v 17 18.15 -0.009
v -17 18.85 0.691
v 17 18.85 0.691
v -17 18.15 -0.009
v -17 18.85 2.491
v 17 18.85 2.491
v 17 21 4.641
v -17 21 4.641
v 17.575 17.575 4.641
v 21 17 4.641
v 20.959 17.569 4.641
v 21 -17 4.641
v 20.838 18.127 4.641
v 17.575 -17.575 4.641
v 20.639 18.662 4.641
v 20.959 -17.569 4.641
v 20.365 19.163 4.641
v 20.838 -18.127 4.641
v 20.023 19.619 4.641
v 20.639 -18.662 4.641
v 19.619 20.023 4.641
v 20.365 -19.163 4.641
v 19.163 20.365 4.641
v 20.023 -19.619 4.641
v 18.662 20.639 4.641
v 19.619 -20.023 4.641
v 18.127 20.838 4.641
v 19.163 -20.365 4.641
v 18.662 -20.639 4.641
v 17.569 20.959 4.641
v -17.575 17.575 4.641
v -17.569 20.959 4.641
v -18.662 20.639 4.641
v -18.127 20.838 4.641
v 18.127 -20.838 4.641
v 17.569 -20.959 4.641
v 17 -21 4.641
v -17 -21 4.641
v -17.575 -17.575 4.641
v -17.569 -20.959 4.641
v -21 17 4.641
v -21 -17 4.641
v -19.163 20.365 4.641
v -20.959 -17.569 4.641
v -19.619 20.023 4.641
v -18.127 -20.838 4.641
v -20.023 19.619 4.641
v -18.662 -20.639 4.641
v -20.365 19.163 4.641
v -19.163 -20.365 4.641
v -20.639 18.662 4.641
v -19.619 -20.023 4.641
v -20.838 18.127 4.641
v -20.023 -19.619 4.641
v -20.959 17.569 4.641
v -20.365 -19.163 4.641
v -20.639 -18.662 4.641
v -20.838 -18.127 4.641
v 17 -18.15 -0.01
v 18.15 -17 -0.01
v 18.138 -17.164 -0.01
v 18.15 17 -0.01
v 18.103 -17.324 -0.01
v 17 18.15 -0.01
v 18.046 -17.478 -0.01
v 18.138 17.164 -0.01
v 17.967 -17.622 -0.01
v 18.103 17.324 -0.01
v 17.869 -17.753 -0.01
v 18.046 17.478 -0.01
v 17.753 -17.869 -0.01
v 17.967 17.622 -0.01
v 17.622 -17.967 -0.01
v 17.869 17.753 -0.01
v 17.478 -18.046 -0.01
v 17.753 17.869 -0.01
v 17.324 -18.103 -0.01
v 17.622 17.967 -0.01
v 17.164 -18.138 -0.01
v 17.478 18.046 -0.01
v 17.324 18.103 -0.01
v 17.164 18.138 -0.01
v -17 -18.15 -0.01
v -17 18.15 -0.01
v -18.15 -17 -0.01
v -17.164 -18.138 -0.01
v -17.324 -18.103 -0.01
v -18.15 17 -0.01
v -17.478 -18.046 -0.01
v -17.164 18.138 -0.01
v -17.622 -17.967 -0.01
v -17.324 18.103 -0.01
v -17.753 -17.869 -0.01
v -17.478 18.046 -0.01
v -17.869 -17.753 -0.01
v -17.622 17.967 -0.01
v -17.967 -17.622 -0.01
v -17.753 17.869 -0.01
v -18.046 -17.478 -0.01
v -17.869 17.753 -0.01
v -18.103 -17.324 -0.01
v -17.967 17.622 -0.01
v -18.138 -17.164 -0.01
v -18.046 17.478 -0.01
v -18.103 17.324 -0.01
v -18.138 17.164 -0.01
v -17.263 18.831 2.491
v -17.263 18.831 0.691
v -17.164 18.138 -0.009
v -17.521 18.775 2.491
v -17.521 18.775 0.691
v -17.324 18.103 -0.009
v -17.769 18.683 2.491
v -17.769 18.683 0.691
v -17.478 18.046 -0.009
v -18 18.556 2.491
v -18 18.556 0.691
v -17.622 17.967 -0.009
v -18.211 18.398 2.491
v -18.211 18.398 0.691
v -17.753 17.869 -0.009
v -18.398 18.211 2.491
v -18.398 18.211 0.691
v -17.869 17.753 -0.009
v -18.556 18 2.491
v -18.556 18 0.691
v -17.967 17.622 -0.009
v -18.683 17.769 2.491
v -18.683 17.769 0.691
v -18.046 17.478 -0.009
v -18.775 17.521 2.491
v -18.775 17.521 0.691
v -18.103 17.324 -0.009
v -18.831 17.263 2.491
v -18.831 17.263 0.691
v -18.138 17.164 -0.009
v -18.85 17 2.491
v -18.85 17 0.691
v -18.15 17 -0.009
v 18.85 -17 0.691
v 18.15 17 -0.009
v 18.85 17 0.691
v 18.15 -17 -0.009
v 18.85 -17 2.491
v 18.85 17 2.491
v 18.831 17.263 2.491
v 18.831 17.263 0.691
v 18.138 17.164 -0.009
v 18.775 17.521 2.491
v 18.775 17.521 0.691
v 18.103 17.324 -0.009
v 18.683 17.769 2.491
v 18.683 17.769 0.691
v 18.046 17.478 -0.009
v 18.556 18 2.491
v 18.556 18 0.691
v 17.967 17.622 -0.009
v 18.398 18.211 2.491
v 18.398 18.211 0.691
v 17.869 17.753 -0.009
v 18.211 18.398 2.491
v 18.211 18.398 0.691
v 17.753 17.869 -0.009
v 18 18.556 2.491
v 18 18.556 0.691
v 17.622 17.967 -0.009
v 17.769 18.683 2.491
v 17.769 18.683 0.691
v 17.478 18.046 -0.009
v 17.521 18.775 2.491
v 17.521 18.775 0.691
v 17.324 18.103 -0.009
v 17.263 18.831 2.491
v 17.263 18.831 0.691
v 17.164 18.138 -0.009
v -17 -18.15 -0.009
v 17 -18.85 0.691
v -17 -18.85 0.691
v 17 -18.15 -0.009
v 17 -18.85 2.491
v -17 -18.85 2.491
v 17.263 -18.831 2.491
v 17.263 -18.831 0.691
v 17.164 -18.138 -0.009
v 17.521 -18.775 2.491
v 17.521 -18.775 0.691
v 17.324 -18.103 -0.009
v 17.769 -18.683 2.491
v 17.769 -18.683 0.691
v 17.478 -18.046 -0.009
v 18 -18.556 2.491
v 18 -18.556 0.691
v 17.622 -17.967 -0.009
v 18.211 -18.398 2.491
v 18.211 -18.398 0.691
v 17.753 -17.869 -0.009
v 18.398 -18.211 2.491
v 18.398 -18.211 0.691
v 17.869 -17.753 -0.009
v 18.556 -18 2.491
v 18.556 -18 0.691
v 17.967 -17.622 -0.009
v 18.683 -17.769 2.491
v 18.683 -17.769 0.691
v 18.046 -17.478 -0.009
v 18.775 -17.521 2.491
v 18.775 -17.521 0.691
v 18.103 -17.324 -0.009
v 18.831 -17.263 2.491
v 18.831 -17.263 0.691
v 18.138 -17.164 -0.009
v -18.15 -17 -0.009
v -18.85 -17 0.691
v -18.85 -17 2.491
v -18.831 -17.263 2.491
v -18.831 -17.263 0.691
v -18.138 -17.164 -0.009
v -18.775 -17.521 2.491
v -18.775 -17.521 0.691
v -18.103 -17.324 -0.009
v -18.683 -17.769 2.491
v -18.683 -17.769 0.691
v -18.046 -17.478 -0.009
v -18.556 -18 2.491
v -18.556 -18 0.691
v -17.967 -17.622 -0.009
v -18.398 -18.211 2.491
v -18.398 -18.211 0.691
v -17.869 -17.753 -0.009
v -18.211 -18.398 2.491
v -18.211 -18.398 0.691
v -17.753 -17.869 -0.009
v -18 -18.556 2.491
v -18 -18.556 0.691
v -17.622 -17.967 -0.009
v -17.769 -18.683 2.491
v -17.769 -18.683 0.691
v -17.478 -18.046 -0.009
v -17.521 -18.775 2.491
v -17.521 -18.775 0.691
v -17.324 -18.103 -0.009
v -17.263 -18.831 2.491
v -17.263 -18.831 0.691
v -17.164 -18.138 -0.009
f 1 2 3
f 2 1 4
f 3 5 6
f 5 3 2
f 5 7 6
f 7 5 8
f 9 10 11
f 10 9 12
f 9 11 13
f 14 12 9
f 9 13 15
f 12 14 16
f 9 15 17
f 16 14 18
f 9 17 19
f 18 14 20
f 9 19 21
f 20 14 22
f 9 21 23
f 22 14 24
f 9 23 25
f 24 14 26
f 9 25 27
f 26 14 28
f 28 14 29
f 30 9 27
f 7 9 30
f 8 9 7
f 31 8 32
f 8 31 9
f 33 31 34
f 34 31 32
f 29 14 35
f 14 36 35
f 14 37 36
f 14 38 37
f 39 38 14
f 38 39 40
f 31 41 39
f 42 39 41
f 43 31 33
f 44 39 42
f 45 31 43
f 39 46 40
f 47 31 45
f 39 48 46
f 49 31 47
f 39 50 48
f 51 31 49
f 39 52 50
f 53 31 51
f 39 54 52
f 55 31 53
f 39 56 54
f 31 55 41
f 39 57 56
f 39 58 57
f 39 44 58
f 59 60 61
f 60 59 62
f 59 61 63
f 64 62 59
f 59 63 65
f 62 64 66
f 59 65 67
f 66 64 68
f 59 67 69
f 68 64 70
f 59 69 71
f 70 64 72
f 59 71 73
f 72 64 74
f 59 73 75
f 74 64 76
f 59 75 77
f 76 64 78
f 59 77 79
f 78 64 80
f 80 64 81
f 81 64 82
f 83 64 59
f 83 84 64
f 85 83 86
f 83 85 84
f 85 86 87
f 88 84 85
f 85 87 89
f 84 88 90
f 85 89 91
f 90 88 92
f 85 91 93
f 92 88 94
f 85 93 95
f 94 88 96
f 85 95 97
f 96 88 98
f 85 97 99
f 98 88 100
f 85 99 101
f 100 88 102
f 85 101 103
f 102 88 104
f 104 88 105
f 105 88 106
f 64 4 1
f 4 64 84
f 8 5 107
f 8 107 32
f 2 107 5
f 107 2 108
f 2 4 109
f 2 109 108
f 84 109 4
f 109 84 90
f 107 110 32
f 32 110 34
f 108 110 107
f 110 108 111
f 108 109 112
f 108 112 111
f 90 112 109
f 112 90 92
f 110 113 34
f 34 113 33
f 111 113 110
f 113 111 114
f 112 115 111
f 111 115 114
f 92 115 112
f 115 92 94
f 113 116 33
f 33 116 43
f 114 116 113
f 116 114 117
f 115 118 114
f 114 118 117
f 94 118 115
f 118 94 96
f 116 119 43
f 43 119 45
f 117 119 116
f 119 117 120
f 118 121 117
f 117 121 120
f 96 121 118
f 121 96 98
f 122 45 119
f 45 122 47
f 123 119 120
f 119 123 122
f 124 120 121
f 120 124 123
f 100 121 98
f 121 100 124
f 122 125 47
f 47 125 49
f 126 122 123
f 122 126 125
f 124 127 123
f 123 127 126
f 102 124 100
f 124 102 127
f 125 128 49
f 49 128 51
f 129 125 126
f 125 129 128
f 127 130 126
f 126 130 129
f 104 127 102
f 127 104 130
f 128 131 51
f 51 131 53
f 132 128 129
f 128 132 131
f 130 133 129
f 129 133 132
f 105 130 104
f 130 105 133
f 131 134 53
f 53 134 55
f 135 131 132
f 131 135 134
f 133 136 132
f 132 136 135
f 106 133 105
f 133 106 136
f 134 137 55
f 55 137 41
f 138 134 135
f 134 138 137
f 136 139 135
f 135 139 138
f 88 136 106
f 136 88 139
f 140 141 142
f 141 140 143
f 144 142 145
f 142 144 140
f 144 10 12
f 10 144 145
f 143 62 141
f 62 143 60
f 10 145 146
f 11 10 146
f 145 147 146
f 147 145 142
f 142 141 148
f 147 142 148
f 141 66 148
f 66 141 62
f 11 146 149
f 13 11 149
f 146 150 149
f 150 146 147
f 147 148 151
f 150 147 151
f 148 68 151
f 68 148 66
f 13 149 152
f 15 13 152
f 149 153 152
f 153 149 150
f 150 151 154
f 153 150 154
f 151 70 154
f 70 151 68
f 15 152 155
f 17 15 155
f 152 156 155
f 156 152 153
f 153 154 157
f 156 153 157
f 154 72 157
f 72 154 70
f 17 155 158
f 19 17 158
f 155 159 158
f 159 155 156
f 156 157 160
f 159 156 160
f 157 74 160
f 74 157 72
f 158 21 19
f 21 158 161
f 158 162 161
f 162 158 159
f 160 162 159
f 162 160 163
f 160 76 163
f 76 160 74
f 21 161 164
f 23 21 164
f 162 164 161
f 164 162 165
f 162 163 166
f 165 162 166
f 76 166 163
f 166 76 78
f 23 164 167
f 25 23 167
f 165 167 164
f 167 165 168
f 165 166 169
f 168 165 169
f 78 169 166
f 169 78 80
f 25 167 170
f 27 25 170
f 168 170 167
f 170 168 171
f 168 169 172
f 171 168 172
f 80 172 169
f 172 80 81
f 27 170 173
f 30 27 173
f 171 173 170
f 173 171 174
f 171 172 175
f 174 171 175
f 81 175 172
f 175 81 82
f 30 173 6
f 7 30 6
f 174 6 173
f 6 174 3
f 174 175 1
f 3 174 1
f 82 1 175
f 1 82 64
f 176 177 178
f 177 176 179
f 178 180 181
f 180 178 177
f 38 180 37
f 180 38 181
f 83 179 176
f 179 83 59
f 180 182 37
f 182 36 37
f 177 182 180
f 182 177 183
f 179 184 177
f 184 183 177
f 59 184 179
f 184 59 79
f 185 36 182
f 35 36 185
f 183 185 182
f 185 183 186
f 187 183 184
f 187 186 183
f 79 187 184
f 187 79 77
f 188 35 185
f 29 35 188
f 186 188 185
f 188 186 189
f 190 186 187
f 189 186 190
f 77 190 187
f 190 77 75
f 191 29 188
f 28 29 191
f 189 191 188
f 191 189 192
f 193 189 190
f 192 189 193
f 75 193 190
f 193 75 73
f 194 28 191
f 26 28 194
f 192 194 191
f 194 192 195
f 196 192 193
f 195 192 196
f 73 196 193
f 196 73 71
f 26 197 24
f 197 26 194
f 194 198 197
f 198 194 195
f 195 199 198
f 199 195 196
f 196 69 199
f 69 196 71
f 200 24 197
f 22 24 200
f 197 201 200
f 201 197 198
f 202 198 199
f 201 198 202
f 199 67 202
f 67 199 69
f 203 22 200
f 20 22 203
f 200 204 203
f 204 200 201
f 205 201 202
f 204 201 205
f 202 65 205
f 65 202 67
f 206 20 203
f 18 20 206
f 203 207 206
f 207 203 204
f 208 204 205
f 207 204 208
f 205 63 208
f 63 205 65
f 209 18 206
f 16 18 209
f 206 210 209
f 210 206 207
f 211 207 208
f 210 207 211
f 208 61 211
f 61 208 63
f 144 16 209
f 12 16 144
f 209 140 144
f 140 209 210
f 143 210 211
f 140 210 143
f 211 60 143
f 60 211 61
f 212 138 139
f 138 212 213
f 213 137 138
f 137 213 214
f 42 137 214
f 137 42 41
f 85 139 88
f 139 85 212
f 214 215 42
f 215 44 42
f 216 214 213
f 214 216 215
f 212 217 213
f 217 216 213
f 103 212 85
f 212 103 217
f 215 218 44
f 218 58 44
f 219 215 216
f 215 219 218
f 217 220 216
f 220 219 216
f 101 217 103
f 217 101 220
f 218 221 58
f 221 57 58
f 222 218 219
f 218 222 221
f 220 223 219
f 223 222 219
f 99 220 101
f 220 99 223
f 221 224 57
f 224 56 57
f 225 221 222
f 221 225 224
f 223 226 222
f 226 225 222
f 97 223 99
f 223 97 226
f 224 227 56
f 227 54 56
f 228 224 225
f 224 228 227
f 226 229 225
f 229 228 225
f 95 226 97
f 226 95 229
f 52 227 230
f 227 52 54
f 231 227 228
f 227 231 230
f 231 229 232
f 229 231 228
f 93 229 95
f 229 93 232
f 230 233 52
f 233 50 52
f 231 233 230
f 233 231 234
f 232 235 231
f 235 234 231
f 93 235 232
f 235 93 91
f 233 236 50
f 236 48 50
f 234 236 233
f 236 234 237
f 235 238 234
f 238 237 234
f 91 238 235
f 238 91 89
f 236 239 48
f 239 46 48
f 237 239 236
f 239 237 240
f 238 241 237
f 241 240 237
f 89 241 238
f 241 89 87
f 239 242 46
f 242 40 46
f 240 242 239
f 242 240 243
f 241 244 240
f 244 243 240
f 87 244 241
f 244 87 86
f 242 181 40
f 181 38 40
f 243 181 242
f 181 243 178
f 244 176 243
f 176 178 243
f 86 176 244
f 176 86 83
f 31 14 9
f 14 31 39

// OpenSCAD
// Simplified standalone Gridfinity base tile.
// This version keeps only the geometry and parameters used by the current model.

/* [Setup Parameters] */
$fa = 8;
$fs = 0.25;

/* [General Settings] */
gridx = 1;
gridy = 1;

/* [Fit to Drawer] */
distancex = 0;
distancey = 0;
fitx = 0; // [-1:0.1:1]
fity = 0; // [-1:0.1:1]

GRID_SIZE_MM = 42;
TOLLERANCE = 0.02;

BASEPLATE_HEIGHT = 4.631;
BASEPLATE_OUTER_DIAMETER = 8;
BASEPLATE_OUTER_RADIUS = BASEPLATE_OUTER_DIAMETER / 2;

_BASEPLATE_PROFILE = [
    [0, 0],
    [0.7, 0.7],
    [0.7, 2.5],
    [2.85, 4.65]
];

BASEPLATE_INNER_RADIUS = BASEPLATE_OUTER_RADIUS - _BASEPLATE_PROFILE[3].x;
BASEPLATE_INNER_DIAMETER = BASEPLATE_INNER_RADIUS * 2;

function foreach_add(list, to_add) =
    [for (item = list) item + to_add];

function _affine_rotate_x(angle_x) = [
    [1, 0, 0, 0],
    [0, cos(angle_x), -sin(angle_x), 0],
    [0, sin(angle_x), cos(angle_x), 0],
    [0, 0, 0, 1]
];

function _affine_rotate_y(angle_y) = [
    [cos(angle_y), 0, sin(angle_y), 0],
    [0, 1, 0, 0],
    [-sin(angle_y), 0, cos(angle_y), 0],
    [0, 0, 0, 1]
];

function _affine_rotate_z(angle_z) = [
    [cos(angle_z), -sin(angle_z), 0, 0],
    [sin(angle_z), cos(angle_z), 0, 0],
    [0, 0, 1, 0],
    [0, 0, 0, 1]
];

function affine_rotate(angle_vector) =
    _affine_rotate_z(angle_vector.z) *
    _affine_rotate_y(angle_vector.y) *
    _affine_rotate_x(angle_vector.x);

function affine_translate(vector) = [
    [1, 0, 0, vector.x],
    [0, 1, 0, vector.y],
    [0, 0, 1, vector.z],
    [0, 0, 0, 1]
];

module sweep_rounded(size) {
    width = is_num(size) ? size : size.x;
    length = is_num(size) ? size : size.y;
    half_width = width / 2;
    half_length = length / 2;

    path_points = [
        [-half_width, half_length],
        [half_width, half_length],
        [half_width, -half_length],
        [-half_width, -half_length],
        [-half_width, half_length]
    ];

    path_vectors = [
        path_points[1] - path_points[0],
        path_points[2] - path_points[1],
        path_points[3] - path_points[2],
        path_points[4] - path_points[3]
    ];

    first_translation = affine_translate([path_points[0].y, 0, path_points[0].x]);
    affine_translations = concat([first_translation], [
        for (
            i = 0, a = first_translation;
            i < len(path_vectors);
            a = a * affine_translate([path_vectors[i].y, 0, path_vectors[i].x]), i = i + 1
        )
        a * affine_translate([path_vectors[i].y, 0, path_vectors[i].x])
    ]);

    affine_matrix = affine_rotate([90, 0, 90]);

    walls = [
        for (i = [0 : len(path_vectors) - 1])
        affine_matrix * affine_translations[i]
        * affine_rotate([0, atan2(path_vectors[i].y, path_vectors[i].x), 0])
    ];

    union() {
        for (i = [0 : len(walls) - 1]) {
            multmatrix(walls[i])
            linear_extrude(norm(path_vectors[i]))
            children();

            multmatrix(walls[i] * affine_rotate([-90, 0, 0]))
            rotate_extrude(angle = 90, convexity = 4)
            children();
        }
    }
}

function baseplate_inner_size(size = [GRID_SIZE_MM, GRID_SIZE_MM]) =
    foreach_add(size, BASEPLATE_INNER_DIAMETER - BASEPLATE_OUTER_DIAMETER);

module _baseplate_cutter_polygon(height) {
    clearance_height = height - _BASEPLATE_PROFILE[3].y;
    translated_line = foreach_add(
        _BASEPLATE_PROFILE,
        [BASEPLATE_INNER_RADIUS, clearance_height]
    );

    polygon(concat(translated_line, [
        [0, height],
        [0, 0],
        [translated_line[0].x, 0]
    ]));
}

module baseplate_cutter(size = [GRID_SIZE_MM, GRID_SIZE_MM], height = BASEPLATE_HEIGHT) {
    inner_dimensions = foreach_add(size, -BASEPLATE_OUTER_DIAMETER);
    inner_size = baseplate_inner_size(size);
    cube_dimensions = [
        inner_size.x - BASEPLATE_INNER_RADIUS,
        inner_size.y - BASEPLATE_INNER_RADIUS,
        height
    ];

    union() {
        sweep_rounded(inner_dimensions) {
            _baseplate_cutter_polygon(height);
        }

        translate([0, 0, height / 2])
        cube(cube_dimensions, center = true);
    }
}

module gridfinity_baseplate(grid_size_bases, length, min_size_mm, fit_offset = [0, 0]) {
    grid_size = [
        grid_size_bases.x == 0 ? floor(min_size_mm.x / length) : grid_size_bases.x,
        grid_size_bases.y == 0 ? floor(min_size_mm.y / length) : grid_size_bases.y
    ];

    grid_size_mm = concat(grid_size * length, [BASEPLATE_HEIGHT]);
    size_mm = [
        max(grid_size_mm.x, min_size_mm.x),
        max(grid_size_mm.y, min_size_mm.y),
        BASEPLATE_HEIGHT
    ];
    padding_mm = size_mm - grid_size_mm;

    fit_percent_positive = [
        (fit_offset.x + 1) / 2,
        (fit_offset.y + 1) / 2
    ];

    padding_start_point = -grid_size_mm / 2 - [
        padding_mm.x * (1 - fit_percent_positive.x),
        padding_mm.y * (1 - fit_percent_positive.y),
        -grid_size_mm.z / 2
    ];

    echo(str("Number of Grids per axes (X, Y)]: ", grid_size));
    echo(str("Final size (in mm): ", size_mm));

    if (padding_mm != [0, 0, 0]) {
        echo(str("Padding +X (in mm): ", padding_mm.x * fit_percent_positive.x));
        echo(str("Padding -X (in mm): ", padding_mm.x * (1 - fit_percent_positive.x)));
        echo(str("Padding +Y (in mm): ", padding_mm.y * fit_percent_positive.y));
        echo(str("Padding -Y (in mm): ", padding_mm.y * (1 - fit_percent_positive.y)));
    }

    translate(padding_start_point)
    for (x = [0 : grid_size.x - 1]) {
        for (y = [0 : grid_size.y - 1]) {
            translate([
                (x + 0.5) * length,
                (y + 0.5) * length,
                -TOLLERANCE / 2
            ])
            baseplate_cutter([length, length], BASEPLATE_HEIGHT + TOLLERANCE);
        }
    }
}

gridfinity_baseplate([gridx, gridy], GRID_SIZE_MM, [distancex, distancey], [fitx, fity]);
